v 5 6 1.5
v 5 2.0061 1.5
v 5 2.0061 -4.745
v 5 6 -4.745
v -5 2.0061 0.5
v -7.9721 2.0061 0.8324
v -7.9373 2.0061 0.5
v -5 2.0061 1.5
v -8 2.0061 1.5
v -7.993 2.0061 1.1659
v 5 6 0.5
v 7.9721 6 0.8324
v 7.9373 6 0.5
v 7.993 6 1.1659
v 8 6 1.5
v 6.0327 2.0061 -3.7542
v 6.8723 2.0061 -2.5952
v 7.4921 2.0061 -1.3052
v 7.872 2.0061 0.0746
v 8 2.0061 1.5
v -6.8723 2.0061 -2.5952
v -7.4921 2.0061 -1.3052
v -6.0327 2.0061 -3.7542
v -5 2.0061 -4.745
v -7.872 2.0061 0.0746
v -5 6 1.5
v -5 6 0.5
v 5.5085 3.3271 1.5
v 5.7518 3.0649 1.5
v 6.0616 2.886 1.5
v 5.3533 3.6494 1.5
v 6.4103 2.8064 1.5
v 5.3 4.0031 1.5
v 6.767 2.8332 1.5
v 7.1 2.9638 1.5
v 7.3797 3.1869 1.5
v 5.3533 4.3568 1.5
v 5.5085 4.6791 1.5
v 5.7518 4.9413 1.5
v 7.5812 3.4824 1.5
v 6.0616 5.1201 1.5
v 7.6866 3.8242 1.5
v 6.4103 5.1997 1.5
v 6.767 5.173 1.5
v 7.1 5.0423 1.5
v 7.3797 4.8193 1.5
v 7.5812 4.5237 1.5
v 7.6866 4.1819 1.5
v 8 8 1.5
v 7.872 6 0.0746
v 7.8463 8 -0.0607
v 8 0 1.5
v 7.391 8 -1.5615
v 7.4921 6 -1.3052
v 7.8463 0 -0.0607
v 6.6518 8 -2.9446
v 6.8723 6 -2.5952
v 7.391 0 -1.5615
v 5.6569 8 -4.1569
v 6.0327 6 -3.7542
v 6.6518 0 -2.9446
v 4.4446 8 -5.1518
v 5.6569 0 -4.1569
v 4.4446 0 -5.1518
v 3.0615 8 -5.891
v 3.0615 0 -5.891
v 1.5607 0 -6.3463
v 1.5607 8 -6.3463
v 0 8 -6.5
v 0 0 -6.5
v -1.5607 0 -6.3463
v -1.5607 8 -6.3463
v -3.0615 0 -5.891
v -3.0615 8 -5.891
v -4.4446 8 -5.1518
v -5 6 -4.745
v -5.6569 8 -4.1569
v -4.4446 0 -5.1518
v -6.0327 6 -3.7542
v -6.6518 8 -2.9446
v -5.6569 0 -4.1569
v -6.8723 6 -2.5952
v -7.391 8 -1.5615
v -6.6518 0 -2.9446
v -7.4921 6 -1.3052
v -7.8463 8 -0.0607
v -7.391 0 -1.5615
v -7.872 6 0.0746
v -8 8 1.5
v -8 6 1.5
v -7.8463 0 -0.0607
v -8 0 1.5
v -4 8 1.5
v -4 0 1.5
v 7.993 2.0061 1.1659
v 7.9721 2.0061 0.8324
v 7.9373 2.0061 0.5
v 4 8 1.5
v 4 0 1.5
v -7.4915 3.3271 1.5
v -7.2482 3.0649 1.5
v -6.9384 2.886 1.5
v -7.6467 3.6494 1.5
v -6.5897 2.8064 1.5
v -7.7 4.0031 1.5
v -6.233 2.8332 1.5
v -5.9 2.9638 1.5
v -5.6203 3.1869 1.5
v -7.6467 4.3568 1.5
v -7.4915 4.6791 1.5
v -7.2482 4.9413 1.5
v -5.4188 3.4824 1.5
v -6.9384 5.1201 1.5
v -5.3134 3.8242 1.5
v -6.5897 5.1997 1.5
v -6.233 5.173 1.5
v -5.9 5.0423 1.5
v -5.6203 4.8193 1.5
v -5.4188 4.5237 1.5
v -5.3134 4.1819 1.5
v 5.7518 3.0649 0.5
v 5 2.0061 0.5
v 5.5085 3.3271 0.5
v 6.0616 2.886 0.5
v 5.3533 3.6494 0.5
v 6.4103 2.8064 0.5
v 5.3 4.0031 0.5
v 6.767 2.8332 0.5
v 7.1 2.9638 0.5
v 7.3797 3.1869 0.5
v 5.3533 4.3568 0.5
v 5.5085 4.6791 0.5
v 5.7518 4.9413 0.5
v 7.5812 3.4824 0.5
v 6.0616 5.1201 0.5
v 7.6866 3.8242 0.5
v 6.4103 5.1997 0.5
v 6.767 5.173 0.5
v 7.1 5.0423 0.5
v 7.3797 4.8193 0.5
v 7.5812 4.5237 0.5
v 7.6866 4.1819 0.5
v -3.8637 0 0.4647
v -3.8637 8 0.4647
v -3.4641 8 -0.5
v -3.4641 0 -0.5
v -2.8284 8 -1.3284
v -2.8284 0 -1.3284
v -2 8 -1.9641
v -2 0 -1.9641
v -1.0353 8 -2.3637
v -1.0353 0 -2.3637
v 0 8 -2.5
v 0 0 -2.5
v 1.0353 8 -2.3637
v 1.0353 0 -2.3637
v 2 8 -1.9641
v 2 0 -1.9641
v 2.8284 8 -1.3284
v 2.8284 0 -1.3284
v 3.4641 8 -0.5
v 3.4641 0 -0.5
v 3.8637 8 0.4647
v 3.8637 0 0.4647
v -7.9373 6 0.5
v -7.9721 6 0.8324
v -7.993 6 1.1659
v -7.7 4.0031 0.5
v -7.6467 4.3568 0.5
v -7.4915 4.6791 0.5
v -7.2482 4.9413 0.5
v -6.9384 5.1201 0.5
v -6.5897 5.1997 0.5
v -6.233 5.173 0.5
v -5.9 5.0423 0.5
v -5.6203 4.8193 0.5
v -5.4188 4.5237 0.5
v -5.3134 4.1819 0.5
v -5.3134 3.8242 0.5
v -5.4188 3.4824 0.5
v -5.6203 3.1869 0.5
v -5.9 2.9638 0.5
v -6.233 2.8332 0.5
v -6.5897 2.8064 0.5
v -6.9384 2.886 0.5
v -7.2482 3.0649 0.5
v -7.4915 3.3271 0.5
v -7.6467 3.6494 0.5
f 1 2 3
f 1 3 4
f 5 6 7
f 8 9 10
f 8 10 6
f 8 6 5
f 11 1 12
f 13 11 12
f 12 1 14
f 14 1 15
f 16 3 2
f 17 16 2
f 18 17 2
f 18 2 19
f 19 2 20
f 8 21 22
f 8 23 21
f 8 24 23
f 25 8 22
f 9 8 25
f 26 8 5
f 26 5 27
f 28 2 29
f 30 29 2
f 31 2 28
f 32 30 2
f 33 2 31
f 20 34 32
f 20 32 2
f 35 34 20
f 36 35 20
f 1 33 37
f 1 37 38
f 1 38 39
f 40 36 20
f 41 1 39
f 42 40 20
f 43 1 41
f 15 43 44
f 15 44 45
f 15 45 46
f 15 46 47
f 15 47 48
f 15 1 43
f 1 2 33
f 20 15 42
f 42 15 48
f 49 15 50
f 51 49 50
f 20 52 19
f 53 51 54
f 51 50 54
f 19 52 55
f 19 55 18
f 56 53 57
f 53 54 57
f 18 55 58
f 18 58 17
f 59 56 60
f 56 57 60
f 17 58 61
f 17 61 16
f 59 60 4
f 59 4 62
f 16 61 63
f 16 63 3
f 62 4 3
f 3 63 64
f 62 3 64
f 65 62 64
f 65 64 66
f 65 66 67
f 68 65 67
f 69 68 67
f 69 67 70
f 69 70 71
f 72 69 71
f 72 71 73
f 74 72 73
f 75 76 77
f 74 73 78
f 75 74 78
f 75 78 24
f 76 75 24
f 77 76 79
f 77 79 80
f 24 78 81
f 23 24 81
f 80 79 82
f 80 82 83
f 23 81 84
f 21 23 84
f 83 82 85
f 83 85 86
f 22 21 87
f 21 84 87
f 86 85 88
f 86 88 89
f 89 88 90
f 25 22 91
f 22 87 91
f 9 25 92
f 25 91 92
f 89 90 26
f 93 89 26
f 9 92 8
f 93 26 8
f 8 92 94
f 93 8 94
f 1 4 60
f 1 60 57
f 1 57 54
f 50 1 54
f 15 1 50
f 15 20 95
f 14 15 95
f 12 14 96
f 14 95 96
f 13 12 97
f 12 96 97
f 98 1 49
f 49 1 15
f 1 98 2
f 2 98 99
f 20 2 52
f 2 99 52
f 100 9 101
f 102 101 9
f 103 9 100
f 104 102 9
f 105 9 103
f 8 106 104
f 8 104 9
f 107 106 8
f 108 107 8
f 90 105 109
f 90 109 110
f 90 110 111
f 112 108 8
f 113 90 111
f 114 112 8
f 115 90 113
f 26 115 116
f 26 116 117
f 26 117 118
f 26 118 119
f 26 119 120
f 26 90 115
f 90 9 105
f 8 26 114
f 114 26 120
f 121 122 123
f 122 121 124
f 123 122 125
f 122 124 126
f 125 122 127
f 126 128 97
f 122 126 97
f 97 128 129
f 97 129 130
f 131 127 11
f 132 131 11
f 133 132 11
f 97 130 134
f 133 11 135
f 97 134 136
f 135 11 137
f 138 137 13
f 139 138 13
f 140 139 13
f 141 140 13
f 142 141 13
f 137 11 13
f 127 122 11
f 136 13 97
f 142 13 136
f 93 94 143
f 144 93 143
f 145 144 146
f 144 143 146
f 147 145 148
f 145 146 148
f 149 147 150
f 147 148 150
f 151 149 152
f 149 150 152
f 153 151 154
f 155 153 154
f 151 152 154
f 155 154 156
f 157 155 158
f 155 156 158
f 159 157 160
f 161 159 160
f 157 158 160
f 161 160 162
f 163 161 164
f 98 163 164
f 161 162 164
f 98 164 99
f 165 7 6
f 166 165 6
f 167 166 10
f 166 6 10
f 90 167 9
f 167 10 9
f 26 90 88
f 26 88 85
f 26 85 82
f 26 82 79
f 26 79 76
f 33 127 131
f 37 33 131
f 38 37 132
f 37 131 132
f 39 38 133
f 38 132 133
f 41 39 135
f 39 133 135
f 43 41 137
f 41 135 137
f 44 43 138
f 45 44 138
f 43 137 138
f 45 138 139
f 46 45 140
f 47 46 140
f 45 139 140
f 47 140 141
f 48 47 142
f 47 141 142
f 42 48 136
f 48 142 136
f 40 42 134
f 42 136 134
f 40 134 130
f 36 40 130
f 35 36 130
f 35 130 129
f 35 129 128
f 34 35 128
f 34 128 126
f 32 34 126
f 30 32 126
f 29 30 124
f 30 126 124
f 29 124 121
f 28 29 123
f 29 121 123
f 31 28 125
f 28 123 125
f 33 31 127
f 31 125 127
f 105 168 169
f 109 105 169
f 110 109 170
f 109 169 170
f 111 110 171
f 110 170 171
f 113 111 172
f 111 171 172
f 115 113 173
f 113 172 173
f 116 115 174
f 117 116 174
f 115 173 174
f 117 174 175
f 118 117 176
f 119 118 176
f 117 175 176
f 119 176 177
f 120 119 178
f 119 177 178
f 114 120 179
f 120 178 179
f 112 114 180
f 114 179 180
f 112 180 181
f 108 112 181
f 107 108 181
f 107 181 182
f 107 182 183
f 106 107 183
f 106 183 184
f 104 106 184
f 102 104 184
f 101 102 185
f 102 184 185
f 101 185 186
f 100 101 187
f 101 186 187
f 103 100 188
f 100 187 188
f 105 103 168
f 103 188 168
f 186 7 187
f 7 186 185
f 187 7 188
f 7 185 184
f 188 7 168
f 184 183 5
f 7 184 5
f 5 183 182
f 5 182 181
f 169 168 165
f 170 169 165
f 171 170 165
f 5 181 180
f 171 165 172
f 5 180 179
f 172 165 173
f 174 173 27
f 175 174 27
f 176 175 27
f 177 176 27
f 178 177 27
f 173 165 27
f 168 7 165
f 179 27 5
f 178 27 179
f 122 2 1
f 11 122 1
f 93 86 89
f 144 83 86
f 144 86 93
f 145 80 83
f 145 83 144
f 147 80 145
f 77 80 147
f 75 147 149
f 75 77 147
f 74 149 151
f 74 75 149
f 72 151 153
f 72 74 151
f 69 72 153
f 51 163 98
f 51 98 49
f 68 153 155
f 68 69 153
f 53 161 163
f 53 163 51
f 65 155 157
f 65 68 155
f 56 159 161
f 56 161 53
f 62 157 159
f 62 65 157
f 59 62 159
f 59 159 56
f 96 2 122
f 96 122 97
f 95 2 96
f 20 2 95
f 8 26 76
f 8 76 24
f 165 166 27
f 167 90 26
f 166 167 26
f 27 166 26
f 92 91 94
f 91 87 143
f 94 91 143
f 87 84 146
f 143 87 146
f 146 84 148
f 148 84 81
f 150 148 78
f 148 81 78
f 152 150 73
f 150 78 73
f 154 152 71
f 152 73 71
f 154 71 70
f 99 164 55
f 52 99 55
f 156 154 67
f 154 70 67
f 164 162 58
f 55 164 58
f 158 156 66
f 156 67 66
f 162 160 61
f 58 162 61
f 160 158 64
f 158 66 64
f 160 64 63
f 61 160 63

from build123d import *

# Parameters (mm, degrees)
BOSS_EXTRUDE1_DEPTH   = 8
SKETCH2_W             = 3
SKETCH2_H             = 3.993853132
CUT_EXTRUDE1_DEPTH    = 10
SKETCH3_W             = 3
SKETCH3_H             = 3.993853132
BOSS_EXTRUDE2_DEPTH   = 1
BOSS_EXTRUDE2_2_DEPTH = 1
CUT_EXTRUDE2_DEPTH    = 8
SKETCH5_R             = 1.2
CUT_EXTRUDE3_DEPTH    = 1


with BuildPart() as part:
    # Sketch1 → Boss-Extrude1 (new body)
    with BuildSketch(Plane(origin=(0, 0, 0), x_dir=(1, 0, 0), z_dir=(0, 1, 0))):
        with BuildLine():
            Line((-8, -1.5), (-4, -1.5))
            ThreePointArc((-4, -1.5), (0, 2.5), (4, -1.5))
            Line((4, -1.5), (8, -1.5))
            ThreePointArc((8, -1.5), (0, 6.5), (-8, -1.5))
        make_face()
    extrude(amount=BOSS_EXTRUDE1_DEPTH)

    # Sketch2 → Cut-Extrude1 (cut)
    with BuildSketch(Plane.XY.offset(1.5)):
        Polygon((-8, 4), (-8, 6), (-5, 6), (-5, 2.006146868), (-8, 2.006146868), align=None)
        with Locations((6.5, 4.003073434)):
            Rectangle(SKETCH2_W, SKETCH2_H)
    extrude(amount=-CUT_EXTRUDE1_DEPTH, mode=Mode.SUBTRACT)


with BuildPart() as body_2:
    # Sketch3 → Boss-Extrude2 (new body)
    with BuildSketch(Plane.XY.offset(1.5)):
        with Locations((-6.5, 4.003073434)):
            Rectangle(SKETCH3_W, SKETCH3_H)
    extrude(amount=-BOSS_EXTRUDE2_DEPTH)


with BuildPart() as body_3:
    # Sketch3 → Boss-Extrude2 2 (new body)
    with BuildSketch(Plane.XY.offset(1.5)):
        with Locations((6.5, 4.003073434)):
            Rectangle(SKETCH3_W, SKETCH3_H)
    extrude(amount=-BOSS_EXTRUDE2_2_DEPTH)


with BuildPart() as cut_extrude2_tool:
    # Sketch4 → Cut-Extrude2 (new body)
    with BuildSketch(Plane.XZ):
        with BuildLine():
            ThreePointArc((-7.937253933, 0.5), (-7.984298074, 0.9990167), (-8, 1.5))
            Line((-8, 1.5), (-8, 0.5))
            Line((-8, 0.5), (-7.937253933, 0.5))
        make_face()
        with BuildLine():
            ThreePointArc((8, 1.5), (7.984298074, 0.9990167), (7.937253933, 0.5))
            Line((7.937253933, 0.5), (8, 0.5))
            Line((8, 0.5), (8, 1.5))
        make_face()
    extrude(amount=-CUT_EXTRUDE2_DEPTH)


with BuildPart() as body_2_1:
    add(body_2.part)

    # Cut-Extrude2: cut by cut_extrude2_tool
    add(cut_extrude2_tool.part, mode=Mode.SUBTRACT)


with BuildPart() as body_3_1:
    add(body_3.part)

    # Cut-Extrude2: cut by cut_extrude2_tool
    add(cut_extrude2_tool.part, mode=Mode.SUBTRACT)


with BuildPart() as cut_extrude3_tool:
    # Sketch5 → Cut-Extrude3 (new body)
    with BuildSketch(Plane(origin=(0, 0, 0.5), x_dir=(-1, 0, 0), z_dir=(0, 0, -1))):
        with Locations((6.5, 4.003073434)):
            Circle(SKETCH5_R)
        with Locations((-6.5, 4.003073434)):
            Circle(SKETCH5_R)
    extrude(amount=-CUT_EXTRUDE3_DEPTH)


with BuildPart() as body_2_2:
    add(body_2_1.part)

    # Cut-Extrude3: cut by cut_extrude3_tool
    add(cut_extrude3_tool.part, mode=Mode.SUBTRACT)


with BuildPart() as body_3_2:
    add(body_3_1.part)

    # Cut-Extrude3: cut by cut_extrude3_tool
    add(cut_extrude3_tool.part, mode=Mode.SUBTRACT)


solid = Compound([part.part, body_2_2.part, body_3_2.part])
